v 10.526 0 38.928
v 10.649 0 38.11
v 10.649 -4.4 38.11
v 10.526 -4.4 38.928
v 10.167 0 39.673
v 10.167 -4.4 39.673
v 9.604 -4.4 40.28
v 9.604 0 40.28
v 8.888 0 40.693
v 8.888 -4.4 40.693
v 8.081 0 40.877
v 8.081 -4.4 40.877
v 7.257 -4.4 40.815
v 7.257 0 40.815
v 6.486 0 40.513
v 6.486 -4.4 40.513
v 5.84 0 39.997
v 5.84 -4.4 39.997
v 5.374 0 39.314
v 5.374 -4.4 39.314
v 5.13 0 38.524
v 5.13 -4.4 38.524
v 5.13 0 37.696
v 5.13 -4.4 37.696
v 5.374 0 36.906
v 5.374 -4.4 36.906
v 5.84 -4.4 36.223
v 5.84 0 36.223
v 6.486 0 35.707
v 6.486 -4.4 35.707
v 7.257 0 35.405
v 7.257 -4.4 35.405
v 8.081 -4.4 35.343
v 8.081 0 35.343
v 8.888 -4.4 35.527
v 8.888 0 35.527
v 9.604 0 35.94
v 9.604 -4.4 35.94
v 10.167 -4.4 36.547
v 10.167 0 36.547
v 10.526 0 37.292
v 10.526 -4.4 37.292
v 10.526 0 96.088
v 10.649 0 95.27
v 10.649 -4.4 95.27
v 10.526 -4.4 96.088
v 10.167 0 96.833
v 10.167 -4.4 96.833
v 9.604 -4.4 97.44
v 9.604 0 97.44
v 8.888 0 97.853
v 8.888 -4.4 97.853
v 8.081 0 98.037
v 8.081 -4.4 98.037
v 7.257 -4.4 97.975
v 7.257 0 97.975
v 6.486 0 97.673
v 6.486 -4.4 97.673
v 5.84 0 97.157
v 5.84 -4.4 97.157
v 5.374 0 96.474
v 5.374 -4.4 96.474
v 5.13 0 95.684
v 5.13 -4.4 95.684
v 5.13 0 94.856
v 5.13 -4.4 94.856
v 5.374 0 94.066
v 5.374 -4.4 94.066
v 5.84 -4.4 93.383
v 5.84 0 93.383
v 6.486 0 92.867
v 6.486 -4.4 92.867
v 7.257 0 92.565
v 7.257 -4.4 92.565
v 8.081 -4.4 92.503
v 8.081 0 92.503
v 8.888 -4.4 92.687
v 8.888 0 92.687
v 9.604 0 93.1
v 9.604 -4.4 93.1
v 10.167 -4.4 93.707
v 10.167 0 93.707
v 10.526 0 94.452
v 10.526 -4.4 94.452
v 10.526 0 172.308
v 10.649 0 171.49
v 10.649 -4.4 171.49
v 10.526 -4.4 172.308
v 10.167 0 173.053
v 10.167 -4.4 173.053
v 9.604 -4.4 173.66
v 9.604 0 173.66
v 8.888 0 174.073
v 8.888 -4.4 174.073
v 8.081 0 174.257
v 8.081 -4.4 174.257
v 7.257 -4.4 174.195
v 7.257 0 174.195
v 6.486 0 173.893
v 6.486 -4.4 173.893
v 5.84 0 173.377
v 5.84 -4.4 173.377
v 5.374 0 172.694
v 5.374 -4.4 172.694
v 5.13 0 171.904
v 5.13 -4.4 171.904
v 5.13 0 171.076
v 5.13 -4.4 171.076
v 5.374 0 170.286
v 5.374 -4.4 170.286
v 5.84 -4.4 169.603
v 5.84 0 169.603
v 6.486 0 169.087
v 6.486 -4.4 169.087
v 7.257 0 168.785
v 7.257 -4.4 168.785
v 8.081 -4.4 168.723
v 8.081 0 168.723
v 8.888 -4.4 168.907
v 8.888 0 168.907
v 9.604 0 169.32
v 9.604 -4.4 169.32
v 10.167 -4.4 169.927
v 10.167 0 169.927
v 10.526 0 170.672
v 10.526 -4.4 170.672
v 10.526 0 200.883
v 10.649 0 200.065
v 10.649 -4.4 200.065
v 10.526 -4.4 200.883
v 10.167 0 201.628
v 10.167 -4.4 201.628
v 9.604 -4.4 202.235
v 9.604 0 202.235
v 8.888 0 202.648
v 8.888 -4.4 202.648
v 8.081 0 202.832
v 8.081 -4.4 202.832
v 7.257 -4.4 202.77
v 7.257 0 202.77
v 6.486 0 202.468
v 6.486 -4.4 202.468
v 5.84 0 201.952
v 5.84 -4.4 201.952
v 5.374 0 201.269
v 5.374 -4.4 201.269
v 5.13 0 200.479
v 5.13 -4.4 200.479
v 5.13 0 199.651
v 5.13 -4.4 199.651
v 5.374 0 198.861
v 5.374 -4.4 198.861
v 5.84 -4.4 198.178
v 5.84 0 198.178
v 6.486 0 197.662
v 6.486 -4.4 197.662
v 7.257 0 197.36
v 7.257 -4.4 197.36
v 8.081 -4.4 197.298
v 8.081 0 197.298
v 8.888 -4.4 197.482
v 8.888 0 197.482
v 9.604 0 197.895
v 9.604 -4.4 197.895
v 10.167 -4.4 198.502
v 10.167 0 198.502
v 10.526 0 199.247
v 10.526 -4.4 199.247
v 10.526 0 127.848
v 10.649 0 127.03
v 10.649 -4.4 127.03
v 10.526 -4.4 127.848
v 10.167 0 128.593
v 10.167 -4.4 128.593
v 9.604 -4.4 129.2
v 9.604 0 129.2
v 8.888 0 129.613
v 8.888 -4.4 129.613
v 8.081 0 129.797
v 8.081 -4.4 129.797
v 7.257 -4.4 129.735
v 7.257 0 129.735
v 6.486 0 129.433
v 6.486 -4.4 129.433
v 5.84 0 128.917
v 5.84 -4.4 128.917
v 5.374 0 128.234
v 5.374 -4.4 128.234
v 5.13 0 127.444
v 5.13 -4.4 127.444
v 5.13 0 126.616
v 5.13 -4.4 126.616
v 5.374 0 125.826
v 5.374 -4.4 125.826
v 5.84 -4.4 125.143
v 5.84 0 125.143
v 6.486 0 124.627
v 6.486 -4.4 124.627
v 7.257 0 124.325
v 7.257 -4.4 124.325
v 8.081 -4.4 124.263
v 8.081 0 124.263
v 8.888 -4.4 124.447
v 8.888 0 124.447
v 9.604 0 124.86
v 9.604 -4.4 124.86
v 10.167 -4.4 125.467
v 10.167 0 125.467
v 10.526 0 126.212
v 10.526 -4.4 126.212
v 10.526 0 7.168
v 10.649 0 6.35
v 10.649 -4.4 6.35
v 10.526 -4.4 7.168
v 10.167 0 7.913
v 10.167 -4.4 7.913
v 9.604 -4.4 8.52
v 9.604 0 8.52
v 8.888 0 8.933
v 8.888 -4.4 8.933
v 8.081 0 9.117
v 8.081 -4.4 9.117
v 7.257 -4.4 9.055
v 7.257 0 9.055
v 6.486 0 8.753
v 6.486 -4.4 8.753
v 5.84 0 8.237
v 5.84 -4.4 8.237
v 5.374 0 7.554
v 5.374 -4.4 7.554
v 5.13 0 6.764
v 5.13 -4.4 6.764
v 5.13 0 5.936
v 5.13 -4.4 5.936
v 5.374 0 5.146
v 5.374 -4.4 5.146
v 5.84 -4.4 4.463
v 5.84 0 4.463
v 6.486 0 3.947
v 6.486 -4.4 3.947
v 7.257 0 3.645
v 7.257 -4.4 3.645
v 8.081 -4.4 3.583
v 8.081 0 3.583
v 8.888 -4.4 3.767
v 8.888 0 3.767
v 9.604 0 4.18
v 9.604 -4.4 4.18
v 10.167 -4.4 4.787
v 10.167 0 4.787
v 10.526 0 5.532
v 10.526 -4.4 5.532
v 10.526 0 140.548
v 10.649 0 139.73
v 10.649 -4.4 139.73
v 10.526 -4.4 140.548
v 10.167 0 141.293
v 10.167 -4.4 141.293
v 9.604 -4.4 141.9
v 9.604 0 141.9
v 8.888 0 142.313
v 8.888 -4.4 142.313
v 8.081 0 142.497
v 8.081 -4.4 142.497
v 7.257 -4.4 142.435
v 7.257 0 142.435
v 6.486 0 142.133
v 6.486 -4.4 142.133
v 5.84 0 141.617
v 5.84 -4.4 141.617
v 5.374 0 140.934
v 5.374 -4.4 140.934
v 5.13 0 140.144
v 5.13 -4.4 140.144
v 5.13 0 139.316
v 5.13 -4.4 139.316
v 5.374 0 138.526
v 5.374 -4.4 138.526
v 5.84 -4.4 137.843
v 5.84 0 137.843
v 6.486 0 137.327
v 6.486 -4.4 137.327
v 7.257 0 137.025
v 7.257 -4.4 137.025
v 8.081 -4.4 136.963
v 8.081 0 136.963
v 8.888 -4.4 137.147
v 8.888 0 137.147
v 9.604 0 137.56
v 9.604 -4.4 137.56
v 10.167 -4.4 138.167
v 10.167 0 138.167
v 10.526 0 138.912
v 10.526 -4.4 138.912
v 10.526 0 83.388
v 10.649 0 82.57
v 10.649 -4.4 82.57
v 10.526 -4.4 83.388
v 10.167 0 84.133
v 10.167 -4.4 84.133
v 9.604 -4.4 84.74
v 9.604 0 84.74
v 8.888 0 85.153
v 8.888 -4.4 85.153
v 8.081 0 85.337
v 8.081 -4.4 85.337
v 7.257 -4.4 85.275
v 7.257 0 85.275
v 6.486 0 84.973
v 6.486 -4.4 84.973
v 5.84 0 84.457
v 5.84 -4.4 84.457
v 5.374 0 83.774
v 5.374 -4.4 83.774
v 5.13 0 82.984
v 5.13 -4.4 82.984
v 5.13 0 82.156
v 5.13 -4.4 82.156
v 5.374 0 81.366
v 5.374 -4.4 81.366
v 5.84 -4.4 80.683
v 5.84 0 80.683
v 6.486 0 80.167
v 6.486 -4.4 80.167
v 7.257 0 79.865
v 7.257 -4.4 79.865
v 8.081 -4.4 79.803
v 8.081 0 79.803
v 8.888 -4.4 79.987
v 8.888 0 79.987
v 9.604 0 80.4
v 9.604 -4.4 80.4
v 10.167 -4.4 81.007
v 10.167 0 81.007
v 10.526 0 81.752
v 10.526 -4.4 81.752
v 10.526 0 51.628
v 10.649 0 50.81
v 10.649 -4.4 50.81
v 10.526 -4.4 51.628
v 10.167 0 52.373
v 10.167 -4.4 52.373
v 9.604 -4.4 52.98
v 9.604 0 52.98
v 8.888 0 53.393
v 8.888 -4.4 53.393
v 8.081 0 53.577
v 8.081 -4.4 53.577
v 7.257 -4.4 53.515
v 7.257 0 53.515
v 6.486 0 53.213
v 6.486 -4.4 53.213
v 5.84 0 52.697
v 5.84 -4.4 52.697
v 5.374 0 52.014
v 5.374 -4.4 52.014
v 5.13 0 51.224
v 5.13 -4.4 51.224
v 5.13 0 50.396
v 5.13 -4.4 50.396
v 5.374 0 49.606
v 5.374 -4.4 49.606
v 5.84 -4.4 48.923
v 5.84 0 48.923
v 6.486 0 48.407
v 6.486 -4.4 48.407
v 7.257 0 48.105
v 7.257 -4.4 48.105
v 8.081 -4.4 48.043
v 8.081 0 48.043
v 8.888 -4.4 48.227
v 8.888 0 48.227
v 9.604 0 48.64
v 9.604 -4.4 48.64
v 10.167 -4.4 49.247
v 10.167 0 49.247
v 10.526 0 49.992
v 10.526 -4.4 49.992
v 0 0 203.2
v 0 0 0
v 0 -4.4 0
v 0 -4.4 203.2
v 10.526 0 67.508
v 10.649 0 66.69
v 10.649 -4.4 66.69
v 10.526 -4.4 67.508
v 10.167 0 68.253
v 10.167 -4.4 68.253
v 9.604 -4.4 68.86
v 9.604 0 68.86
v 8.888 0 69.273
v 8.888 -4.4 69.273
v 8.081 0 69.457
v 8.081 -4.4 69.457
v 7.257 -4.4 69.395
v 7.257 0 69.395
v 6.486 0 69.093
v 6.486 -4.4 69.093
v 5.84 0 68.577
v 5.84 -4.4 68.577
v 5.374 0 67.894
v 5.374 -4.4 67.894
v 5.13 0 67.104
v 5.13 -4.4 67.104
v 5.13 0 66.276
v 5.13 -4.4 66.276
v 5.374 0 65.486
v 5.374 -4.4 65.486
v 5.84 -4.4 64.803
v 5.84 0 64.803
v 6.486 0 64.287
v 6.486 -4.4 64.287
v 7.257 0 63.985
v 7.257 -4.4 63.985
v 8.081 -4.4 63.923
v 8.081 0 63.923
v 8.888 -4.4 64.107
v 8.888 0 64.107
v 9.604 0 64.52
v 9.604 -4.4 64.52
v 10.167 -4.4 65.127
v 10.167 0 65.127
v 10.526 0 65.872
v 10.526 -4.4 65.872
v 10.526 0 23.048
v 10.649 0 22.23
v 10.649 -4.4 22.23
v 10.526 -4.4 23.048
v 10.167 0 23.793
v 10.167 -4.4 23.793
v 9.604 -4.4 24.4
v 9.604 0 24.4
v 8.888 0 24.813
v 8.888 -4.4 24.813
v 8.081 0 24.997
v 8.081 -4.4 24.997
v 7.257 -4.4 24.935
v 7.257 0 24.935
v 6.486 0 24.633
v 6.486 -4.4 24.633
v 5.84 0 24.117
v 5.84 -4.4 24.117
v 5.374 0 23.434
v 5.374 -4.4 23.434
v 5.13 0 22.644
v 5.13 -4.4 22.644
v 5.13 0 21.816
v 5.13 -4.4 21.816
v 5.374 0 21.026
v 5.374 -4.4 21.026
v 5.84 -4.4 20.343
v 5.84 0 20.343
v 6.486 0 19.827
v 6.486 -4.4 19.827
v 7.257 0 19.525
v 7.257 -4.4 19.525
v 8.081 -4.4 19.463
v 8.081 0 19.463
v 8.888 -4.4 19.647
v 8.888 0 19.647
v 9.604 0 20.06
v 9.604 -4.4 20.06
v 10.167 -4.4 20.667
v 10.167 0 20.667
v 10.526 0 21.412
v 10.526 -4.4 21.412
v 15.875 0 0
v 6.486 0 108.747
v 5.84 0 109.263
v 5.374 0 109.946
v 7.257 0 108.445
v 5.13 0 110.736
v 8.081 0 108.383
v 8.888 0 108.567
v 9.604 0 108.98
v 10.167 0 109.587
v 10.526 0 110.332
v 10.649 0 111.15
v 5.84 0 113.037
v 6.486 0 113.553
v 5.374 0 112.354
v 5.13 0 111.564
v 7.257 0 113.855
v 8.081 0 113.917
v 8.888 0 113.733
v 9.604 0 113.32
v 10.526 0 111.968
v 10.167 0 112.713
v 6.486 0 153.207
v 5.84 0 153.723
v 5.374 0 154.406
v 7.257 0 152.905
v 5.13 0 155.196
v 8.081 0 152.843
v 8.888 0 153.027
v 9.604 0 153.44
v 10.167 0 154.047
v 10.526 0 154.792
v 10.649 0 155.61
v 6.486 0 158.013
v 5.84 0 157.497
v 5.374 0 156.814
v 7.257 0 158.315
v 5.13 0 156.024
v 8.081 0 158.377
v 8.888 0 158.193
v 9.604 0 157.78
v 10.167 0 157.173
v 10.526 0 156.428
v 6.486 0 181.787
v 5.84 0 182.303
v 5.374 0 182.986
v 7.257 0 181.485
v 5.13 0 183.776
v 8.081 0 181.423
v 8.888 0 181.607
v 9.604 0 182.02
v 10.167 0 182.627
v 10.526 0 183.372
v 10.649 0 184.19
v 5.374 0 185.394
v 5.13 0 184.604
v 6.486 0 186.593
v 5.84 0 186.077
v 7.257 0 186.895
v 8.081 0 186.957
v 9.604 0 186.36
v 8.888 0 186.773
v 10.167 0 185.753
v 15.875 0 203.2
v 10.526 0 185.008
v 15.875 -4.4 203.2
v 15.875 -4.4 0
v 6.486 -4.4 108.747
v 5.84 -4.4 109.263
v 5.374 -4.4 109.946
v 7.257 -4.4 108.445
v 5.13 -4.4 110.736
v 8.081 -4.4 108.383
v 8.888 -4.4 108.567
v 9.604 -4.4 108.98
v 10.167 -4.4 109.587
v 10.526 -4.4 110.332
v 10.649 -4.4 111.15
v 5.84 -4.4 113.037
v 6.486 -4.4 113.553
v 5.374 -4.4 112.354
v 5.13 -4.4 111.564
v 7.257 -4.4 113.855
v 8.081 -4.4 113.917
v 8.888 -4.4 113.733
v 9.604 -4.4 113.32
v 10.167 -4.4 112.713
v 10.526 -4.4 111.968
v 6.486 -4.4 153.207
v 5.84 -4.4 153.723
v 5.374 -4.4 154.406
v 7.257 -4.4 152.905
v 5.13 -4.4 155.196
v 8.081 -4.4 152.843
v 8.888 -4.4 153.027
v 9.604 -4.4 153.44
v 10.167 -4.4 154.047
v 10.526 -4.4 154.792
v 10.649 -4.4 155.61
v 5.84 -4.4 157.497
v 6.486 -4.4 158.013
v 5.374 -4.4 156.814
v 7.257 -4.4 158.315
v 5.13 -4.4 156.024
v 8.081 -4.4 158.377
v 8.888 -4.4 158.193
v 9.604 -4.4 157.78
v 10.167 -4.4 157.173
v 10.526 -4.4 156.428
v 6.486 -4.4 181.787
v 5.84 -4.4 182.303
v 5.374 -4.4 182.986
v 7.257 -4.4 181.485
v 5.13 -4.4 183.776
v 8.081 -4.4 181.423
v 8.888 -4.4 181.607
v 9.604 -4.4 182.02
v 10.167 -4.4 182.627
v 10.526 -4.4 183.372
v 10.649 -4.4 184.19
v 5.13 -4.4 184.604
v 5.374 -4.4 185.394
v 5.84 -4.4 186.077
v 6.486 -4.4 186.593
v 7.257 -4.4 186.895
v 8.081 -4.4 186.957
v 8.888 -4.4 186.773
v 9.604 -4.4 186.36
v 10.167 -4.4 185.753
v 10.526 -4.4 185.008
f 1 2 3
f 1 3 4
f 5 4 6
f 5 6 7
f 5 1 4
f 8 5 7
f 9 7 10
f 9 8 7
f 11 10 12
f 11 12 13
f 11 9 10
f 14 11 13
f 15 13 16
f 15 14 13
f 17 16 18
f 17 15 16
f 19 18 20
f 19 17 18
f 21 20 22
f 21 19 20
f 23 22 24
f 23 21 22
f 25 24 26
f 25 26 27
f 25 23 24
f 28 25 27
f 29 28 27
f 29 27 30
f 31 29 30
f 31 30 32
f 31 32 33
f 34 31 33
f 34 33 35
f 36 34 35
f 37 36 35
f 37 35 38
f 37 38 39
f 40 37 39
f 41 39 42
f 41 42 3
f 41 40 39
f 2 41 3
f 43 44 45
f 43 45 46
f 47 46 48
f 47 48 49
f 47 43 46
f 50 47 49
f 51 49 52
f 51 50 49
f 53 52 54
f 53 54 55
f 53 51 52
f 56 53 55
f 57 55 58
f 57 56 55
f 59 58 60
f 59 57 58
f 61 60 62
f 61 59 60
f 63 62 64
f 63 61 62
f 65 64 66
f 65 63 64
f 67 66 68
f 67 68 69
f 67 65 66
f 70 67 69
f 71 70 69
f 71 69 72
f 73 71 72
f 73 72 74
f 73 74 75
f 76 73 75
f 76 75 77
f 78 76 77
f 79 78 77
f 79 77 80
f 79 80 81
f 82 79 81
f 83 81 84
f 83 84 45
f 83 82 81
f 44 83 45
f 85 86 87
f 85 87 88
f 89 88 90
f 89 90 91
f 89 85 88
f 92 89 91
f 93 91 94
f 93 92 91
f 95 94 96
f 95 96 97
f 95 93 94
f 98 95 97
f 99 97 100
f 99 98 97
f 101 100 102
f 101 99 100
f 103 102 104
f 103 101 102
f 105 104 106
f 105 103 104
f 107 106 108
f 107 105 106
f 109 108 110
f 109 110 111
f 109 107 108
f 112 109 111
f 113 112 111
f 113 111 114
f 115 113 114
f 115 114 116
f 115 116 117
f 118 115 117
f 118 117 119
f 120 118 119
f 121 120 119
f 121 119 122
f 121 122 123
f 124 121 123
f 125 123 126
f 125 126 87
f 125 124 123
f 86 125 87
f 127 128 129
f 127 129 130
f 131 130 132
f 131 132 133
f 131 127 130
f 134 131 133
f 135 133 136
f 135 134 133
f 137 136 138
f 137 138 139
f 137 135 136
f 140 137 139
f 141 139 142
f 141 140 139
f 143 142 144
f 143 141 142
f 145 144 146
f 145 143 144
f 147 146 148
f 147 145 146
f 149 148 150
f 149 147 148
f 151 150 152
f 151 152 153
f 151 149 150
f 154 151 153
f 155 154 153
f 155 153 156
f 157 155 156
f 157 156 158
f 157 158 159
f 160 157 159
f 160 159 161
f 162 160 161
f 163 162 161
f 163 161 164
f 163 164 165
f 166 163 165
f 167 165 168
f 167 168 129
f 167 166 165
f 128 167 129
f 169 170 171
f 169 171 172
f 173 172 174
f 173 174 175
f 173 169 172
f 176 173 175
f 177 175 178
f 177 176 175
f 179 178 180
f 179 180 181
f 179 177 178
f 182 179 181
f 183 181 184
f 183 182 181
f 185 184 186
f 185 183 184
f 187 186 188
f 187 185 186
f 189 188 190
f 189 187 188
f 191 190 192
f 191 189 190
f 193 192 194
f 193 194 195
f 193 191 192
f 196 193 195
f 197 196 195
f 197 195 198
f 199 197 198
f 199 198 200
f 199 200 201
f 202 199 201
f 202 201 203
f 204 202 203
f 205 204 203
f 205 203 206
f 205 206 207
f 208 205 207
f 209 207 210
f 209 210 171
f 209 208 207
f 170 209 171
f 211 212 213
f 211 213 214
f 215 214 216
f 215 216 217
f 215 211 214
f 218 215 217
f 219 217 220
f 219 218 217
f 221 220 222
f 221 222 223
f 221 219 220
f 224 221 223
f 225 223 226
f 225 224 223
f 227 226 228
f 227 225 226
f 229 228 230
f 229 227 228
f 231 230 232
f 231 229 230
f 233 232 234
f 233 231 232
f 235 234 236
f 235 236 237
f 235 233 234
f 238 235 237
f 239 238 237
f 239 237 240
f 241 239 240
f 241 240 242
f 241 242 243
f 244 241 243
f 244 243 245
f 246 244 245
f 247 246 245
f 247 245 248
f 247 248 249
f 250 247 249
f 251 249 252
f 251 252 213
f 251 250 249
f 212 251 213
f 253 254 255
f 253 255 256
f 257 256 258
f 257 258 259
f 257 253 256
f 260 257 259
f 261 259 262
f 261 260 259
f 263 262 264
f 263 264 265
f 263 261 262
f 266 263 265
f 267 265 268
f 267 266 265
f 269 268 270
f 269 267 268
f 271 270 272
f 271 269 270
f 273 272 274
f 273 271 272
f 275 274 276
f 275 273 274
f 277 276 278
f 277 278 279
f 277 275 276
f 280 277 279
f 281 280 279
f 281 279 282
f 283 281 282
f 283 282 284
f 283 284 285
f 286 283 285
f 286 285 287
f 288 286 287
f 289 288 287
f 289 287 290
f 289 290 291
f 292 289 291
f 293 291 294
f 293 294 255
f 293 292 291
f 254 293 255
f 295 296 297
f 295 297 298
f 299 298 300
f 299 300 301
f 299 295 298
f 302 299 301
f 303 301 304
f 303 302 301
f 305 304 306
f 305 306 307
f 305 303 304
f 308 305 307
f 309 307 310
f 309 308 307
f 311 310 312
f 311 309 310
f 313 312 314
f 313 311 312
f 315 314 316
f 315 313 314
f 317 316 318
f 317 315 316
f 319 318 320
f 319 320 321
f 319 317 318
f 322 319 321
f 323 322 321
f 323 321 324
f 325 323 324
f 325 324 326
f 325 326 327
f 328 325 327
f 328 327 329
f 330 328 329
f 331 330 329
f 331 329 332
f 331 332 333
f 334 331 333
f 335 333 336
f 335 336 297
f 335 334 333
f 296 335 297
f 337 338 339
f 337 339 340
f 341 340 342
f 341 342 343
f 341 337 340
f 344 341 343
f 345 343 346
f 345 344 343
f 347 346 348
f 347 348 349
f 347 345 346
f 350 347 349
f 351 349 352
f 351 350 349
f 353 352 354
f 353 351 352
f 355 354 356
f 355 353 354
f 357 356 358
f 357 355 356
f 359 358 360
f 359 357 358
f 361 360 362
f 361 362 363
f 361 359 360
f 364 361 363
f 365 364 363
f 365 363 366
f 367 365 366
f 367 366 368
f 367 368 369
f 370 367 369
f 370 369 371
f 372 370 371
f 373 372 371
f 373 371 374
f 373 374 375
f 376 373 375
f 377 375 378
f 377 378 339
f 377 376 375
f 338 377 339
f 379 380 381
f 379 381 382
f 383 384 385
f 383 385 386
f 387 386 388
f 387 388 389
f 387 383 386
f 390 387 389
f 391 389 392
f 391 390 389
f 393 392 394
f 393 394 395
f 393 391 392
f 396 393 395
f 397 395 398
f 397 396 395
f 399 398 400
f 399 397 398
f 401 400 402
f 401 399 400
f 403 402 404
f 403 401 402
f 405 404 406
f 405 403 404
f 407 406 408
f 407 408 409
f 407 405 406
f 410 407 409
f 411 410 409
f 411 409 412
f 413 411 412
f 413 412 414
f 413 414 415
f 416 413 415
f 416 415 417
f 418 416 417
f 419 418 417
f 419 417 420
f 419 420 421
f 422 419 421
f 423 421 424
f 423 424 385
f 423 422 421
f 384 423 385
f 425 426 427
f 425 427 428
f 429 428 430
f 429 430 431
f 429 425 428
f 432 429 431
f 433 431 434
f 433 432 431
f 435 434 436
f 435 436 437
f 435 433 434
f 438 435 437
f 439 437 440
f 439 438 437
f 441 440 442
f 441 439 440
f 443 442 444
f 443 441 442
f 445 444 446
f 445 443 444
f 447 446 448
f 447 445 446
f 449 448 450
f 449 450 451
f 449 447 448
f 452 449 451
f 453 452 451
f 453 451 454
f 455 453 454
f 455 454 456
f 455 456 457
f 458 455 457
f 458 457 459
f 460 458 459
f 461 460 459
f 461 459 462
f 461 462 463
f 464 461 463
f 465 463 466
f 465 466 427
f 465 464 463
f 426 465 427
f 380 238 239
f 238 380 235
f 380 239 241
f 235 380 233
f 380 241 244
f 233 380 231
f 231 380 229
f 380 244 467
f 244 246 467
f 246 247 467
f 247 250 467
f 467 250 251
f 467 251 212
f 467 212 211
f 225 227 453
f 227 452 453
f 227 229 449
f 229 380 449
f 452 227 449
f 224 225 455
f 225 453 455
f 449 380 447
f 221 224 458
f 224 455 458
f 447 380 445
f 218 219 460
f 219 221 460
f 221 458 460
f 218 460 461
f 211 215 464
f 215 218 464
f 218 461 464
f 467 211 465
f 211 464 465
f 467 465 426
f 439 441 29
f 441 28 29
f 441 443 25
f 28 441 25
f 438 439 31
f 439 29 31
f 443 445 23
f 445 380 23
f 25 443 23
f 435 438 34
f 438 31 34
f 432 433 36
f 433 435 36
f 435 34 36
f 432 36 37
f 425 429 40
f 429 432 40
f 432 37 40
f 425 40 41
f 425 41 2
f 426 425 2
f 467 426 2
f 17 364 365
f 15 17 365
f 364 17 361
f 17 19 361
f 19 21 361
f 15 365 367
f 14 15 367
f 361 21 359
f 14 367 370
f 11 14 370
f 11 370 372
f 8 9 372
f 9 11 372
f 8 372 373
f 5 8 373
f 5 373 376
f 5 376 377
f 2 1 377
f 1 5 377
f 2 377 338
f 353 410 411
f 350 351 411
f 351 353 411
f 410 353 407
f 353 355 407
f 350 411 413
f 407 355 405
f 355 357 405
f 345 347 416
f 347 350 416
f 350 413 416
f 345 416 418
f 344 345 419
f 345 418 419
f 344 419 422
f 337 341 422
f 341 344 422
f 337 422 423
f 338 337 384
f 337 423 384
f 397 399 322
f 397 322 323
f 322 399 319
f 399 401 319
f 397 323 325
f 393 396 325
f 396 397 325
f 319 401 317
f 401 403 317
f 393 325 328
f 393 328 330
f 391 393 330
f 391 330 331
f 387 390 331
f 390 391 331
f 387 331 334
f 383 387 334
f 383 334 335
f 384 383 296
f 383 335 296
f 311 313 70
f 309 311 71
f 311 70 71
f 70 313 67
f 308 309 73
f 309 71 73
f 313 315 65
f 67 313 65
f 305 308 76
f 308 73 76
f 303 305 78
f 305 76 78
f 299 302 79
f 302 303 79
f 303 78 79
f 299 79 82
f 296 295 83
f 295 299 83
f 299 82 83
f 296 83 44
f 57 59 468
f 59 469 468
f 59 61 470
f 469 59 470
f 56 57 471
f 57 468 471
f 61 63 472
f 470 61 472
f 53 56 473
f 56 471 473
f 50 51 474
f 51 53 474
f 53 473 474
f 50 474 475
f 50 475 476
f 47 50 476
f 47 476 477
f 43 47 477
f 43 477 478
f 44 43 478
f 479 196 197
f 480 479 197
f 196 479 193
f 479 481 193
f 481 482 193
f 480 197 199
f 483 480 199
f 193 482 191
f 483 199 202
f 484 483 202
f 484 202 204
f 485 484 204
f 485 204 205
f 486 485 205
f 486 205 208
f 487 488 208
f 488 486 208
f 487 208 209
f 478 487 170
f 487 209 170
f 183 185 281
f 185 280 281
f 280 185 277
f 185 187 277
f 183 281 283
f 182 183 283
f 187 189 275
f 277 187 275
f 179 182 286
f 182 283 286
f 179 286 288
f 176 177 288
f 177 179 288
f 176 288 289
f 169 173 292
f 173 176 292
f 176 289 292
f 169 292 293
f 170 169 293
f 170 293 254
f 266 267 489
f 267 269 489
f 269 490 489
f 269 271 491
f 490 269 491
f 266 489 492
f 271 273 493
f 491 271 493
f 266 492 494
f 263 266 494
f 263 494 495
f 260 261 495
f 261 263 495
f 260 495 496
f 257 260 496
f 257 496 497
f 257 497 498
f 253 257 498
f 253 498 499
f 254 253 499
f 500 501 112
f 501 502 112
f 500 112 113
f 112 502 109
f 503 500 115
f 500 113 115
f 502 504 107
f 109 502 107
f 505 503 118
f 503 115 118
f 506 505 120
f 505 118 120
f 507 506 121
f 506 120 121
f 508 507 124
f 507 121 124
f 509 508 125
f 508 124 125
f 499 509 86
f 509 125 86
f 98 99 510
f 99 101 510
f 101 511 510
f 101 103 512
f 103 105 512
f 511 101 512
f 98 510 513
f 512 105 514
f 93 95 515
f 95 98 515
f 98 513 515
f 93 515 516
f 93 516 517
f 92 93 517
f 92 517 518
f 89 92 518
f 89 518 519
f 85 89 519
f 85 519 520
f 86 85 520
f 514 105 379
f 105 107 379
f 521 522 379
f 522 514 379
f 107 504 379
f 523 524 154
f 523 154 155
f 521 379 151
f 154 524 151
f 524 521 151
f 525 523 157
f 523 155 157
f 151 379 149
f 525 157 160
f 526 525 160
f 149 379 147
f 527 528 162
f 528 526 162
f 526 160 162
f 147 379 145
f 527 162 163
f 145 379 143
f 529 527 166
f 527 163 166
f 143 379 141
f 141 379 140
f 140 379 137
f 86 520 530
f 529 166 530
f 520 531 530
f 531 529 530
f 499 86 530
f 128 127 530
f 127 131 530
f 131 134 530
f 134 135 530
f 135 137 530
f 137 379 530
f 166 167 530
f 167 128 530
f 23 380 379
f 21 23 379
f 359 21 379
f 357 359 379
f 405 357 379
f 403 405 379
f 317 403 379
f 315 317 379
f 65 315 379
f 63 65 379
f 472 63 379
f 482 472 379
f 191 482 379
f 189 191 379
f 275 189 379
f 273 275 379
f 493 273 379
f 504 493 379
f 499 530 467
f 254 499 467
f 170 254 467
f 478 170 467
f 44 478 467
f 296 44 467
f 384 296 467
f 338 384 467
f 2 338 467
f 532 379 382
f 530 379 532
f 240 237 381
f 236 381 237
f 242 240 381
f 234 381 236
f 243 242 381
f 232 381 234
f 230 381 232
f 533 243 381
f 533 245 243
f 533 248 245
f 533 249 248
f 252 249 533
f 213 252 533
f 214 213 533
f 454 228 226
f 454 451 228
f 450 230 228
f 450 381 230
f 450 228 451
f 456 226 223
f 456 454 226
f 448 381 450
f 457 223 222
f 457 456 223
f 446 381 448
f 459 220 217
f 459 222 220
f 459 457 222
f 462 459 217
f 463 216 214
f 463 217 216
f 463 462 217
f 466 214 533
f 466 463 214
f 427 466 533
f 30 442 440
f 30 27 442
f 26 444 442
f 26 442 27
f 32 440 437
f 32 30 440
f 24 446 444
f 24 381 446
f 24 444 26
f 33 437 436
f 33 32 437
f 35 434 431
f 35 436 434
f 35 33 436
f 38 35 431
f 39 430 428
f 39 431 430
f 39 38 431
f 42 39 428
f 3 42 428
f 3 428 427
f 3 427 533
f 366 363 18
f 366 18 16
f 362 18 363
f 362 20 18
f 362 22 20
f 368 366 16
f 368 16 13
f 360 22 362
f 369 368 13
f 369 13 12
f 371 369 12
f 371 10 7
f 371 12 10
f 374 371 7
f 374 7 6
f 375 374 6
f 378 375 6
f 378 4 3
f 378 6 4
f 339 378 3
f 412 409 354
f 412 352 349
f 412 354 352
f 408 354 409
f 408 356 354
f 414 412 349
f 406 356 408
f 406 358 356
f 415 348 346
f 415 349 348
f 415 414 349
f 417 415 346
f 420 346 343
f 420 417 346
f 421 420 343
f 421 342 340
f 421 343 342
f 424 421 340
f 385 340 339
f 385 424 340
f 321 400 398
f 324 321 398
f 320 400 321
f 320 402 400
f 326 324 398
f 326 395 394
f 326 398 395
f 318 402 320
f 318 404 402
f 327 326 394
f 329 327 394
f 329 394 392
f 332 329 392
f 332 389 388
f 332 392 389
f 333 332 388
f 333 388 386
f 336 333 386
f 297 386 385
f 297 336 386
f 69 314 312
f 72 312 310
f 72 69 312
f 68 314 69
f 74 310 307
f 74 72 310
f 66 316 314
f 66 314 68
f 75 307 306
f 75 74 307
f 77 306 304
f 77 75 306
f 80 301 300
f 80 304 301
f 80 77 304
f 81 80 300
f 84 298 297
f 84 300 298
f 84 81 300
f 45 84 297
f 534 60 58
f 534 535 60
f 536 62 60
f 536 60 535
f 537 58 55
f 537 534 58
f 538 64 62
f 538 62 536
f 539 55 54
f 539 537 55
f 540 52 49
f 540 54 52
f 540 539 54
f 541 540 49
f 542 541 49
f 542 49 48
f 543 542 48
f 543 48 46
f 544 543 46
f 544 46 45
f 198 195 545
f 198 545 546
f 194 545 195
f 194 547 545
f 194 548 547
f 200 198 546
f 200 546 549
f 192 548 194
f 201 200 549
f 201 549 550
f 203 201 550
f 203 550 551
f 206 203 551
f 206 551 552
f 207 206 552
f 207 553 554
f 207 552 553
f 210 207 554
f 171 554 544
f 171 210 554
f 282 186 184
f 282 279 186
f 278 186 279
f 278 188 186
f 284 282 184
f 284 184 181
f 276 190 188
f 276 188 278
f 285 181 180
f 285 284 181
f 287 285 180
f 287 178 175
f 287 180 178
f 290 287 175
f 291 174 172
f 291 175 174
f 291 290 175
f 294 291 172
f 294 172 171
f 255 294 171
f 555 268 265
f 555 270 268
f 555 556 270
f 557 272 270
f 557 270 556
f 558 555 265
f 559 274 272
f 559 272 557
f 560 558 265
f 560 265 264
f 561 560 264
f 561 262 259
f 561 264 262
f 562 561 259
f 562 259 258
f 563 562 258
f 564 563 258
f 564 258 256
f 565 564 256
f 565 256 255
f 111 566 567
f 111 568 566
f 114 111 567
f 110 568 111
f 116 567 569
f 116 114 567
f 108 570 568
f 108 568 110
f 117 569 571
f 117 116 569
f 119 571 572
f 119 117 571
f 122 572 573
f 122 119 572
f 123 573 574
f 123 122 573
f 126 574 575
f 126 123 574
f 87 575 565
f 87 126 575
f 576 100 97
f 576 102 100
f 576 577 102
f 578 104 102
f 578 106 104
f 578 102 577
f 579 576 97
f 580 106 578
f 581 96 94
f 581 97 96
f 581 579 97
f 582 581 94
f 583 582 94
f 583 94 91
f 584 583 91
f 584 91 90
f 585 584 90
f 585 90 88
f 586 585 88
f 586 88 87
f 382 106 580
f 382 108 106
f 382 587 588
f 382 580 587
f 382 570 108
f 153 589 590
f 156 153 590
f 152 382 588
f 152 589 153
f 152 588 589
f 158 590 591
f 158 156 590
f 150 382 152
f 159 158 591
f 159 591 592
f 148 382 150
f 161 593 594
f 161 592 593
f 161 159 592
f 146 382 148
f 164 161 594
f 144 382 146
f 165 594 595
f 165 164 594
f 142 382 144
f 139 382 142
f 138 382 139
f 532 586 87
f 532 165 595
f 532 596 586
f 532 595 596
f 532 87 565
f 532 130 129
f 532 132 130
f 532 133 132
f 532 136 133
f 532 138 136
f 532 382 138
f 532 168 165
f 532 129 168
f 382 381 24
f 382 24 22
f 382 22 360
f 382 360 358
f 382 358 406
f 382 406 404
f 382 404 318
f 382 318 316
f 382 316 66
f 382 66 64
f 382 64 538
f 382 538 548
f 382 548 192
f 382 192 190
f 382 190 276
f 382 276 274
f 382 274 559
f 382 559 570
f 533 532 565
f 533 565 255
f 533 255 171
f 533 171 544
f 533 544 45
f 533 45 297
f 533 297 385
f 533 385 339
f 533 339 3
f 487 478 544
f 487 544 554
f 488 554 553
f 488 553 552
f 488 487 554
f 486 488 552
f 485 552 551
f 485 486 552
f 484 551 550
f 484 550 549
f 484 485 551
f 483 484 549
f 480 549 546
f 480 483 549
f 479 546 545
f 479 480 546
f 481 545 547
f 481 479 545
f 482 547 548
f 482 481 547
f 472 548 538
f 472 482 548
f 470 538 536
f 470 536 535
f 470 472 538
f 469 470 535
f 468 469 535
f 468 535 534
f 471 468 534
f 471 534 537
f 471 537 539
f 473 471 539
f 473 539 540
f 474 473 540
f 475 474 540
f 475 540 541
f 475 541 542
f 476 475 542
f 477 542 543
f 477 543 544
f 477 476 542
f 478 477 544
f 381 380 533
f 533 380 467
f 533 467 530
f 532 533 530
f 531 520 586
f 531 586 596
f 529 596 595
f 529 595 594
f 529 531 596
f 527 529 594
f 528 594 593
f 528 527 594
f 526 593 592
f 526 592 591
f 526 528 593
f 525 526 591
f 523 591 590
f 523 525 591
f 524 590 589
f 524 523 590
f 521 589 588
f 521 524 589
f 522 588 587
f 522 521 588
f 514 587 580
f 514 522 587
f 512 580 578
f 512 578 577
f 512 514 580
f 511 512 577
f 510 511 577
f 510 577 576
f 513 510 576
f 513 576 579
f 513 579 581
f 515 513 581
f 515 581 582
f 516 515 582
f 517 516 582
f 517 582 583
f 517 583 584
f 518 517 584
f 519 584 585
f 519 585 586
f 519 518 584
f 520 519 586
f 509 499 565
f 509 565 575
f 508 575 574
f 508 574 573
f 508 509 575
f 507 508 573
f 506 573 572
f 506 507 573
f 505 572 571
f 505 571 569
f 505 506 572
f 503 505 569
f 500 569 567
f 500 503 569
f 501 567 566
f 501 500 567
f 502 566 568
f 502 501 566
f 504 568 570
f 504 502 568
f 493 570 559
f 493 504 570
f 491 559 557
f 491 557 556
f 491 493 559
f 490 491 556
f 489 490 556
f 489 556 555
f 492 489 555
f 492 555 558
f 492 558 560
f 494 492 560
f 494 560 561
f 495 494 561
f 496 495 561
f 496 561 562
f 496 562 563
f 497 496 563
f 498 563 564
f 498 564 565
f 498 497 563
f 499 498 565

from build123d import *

# Parameters (mm, degrees)
SKETCH_W  = 15.875
SKETCH_H  = 203.2
SKETCH_R  = 2.775
PAD_DEPTH = 4.4


with BuildPart() as part:
    # Sketch → Pad (new body)
    with BuildSketch(Plane.XZ):
        with Locations((7.9375, 101.6)):
            Rectangle(SKETCH_W, SKETCH_H)
        with Locations((7.874, 6.35)):
            Circle(SKETCH_R, mode=Mode.SUBTRACT)
        with Locations((7.874, 22.23)):
            Circle(SKETCH_R, mode=Mode.SUBTRACT)
        with Locations((7.874, 38.11)):
            Circle(SKETCH_R, mode=Mode.SUBTRACT)
        with Locations((7.874, 50.81)):
            Circle(SKETCH_R, mode=Mode.SUBTRACT)
        with Locations((7.874, 66.69)):
            Circle(SKETCH_R, mode=Mode.SUBTRACT)
        with Locations((7.874, 82.57)):
            Circle(SKETCH_R, mode=Mode.SUBTRACT)
        with Locations((7.874, 95.27)):
            Circle(SKETCH_R, mode=Mode.SUBTRACT)
        with Locations((7.874, 111.15)):
            Circle(SKETCH_R, mode=Mode.SUBTRACT)
        with Locations((7.874, 127.03)):
            Circle(SKETCH_R, mode=Mode.SUBTRACT)
        with Locations((7.874, 139.73)):
            Circle(SKETCH_R, mode=Mode.SUBTRACT)
        with Locations((7.874, 155.61)):
            Circle(SKETCH_R, mode=Mode.SUBTRACT)
        with Locations((7.874, 171.49)):
            Circle(SKETCH_R, mode=Mode.SUBTRACT)
        with Locations((7.874, 184.19)):
            Circle(SKETCH_R, mode=Mode.SUBTRACT)
        with Locations((7.874, 200.065)):
            Circle(SKETCH_R, mode=Mode.SUBTRACT)
    extrude(amount=PAD_DEPTH)


solid = part.part
